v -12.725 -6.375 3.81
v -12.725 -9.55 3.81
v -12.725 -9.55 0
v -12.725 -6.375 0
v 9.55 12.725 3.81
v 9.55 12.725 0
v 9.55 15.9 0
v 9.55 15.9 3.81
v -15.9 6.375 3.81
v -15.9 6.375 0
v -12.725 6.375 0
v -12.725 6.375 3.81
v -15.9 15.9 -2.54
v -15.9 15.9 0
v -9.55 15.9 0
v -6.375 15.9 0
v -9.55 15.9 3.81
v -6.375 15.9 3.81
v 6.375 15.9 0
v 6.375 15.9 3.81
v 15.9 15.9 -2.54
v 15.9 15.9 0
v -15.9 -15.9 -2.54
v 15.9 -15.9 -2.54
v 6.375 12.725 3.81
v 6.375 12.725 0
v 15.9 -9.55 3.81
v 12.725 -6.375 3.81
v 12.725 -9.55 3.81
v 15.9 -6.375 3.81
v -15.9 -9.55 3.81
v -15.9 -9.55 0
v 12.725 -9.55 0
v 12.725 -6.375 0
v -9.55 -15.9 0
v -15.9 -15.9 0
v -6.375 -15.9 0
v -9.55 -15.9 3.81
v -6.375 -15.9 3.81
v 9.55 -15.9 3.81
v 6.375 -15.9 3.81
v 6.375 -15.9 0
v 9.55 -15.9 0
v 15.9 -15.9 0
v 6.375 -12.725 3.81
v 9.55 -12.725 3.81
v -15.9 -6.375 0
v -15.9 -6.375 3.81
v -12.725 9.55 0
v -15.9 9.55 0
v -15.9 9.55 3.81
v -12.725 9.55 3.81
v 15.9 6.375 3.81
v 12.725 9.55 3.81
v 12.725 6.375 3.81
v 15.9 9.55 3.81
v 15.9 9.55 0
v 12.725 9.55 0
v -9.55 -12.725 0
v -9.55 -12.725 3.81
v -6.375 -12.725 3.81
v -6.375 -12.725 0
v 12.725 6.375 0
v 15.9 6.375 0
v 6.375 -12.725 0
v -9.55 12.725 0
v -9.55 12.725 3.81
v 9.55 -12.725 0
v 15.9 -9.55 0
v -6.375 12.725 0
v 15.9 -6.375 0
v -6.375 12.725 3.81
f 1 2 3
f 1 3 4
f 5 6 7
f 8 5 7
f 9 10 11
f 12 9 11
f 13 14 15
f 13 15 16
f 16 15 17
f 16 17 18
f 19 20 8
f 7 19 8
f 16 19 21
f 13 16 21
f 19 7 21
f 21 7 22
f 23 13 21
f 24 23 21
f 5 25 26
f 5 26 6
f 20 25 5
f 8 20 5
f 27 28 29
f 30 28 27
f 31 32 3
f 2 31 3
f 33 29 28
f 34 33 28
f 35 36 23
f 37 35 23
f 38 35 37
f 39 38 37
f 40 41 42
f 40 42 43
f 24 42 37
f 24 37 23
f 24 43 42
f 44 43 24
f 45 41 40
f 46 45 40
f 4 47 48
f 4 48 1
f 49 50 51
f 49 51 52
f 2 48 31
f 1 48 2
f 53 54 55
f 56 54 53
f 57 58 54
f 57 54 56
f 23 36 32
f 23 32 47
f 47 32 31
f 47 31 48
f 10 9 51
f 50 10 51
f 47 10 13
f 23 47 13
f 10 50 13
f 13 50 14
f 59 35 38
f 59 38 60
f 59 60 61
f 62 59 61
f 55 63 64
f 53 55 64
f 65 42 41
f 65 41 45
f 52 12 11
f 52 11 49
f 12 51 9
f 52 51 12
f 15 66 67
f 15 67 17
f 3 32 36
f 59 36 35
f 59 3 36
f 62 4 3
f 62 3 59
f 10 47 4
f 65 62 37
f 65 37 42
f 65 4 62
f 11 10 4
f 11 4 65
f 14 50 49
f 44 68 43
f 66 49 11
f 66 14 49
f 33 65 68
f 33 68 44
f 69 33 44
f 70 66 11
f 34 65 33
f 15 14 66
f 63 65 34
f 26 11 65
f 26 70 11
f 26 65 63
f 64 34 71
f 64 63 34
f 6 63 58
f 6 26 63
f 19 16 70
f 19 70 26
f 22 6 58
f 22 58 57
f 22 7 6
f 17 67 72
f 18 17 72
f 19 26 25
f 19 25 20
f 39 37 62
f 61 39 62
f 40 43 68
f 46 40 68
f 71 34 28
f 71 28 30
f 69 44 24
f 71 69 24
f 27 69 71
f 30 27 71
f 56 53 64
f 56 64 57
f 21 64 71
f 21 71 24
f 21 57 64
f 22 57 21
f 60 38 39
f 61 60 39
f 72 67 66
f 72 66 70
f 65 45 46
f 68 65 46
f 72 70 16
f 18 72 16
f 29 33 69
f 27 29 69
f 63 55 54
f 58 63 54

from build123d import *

# Parameters (mm, degrees)
F0_W     = 31.8008
F0_H     = 31.8008
F1_DEPTH = 2.54
F2_W     = 3.175
F2_H     = 3.175
F3_DEPTH = 3.81


with BuildPart() as f1:
    # F0 (on Top) → F1 (new body)
    with BuildSketch(Plane.XY):
        Rectangle(F0_W, F0_H)
    extrude(amount=-F1_DEPTH)

    # F2 (on Top) → F3 (join)
    with BuildSketch(Plane.XY):
        with Locations((-7.9629, 14.3129)):
            Rectangle(F2_W, F2_H)
        with Locations((-14.3129, 7.9629)):
            Rectangle(F2_W, F2_H)
        with Locations((14.3129, 7.9629)):
            Rectangle(F2_W, F2_H)
        with Locations((-14.3129, -7.9629)):
            Rectangle(F2_W, F2_H)
        with Locations((-7.9629, -14.3129)):
            Rectangle(F2_W, F2_H)
        with Locations((7.9629, 14.3129)):
            Rectangle(F2_W, F2_H)
        with Locations((14.3129, -7.9629)):
            Rectangle(F2_W, F2_H)
        with Locations((7.9629, -14.3129)):
            Rectangle(F2_W, F2_H)
    extrude(amount=F3_DEPTH)


solid = f1.part
